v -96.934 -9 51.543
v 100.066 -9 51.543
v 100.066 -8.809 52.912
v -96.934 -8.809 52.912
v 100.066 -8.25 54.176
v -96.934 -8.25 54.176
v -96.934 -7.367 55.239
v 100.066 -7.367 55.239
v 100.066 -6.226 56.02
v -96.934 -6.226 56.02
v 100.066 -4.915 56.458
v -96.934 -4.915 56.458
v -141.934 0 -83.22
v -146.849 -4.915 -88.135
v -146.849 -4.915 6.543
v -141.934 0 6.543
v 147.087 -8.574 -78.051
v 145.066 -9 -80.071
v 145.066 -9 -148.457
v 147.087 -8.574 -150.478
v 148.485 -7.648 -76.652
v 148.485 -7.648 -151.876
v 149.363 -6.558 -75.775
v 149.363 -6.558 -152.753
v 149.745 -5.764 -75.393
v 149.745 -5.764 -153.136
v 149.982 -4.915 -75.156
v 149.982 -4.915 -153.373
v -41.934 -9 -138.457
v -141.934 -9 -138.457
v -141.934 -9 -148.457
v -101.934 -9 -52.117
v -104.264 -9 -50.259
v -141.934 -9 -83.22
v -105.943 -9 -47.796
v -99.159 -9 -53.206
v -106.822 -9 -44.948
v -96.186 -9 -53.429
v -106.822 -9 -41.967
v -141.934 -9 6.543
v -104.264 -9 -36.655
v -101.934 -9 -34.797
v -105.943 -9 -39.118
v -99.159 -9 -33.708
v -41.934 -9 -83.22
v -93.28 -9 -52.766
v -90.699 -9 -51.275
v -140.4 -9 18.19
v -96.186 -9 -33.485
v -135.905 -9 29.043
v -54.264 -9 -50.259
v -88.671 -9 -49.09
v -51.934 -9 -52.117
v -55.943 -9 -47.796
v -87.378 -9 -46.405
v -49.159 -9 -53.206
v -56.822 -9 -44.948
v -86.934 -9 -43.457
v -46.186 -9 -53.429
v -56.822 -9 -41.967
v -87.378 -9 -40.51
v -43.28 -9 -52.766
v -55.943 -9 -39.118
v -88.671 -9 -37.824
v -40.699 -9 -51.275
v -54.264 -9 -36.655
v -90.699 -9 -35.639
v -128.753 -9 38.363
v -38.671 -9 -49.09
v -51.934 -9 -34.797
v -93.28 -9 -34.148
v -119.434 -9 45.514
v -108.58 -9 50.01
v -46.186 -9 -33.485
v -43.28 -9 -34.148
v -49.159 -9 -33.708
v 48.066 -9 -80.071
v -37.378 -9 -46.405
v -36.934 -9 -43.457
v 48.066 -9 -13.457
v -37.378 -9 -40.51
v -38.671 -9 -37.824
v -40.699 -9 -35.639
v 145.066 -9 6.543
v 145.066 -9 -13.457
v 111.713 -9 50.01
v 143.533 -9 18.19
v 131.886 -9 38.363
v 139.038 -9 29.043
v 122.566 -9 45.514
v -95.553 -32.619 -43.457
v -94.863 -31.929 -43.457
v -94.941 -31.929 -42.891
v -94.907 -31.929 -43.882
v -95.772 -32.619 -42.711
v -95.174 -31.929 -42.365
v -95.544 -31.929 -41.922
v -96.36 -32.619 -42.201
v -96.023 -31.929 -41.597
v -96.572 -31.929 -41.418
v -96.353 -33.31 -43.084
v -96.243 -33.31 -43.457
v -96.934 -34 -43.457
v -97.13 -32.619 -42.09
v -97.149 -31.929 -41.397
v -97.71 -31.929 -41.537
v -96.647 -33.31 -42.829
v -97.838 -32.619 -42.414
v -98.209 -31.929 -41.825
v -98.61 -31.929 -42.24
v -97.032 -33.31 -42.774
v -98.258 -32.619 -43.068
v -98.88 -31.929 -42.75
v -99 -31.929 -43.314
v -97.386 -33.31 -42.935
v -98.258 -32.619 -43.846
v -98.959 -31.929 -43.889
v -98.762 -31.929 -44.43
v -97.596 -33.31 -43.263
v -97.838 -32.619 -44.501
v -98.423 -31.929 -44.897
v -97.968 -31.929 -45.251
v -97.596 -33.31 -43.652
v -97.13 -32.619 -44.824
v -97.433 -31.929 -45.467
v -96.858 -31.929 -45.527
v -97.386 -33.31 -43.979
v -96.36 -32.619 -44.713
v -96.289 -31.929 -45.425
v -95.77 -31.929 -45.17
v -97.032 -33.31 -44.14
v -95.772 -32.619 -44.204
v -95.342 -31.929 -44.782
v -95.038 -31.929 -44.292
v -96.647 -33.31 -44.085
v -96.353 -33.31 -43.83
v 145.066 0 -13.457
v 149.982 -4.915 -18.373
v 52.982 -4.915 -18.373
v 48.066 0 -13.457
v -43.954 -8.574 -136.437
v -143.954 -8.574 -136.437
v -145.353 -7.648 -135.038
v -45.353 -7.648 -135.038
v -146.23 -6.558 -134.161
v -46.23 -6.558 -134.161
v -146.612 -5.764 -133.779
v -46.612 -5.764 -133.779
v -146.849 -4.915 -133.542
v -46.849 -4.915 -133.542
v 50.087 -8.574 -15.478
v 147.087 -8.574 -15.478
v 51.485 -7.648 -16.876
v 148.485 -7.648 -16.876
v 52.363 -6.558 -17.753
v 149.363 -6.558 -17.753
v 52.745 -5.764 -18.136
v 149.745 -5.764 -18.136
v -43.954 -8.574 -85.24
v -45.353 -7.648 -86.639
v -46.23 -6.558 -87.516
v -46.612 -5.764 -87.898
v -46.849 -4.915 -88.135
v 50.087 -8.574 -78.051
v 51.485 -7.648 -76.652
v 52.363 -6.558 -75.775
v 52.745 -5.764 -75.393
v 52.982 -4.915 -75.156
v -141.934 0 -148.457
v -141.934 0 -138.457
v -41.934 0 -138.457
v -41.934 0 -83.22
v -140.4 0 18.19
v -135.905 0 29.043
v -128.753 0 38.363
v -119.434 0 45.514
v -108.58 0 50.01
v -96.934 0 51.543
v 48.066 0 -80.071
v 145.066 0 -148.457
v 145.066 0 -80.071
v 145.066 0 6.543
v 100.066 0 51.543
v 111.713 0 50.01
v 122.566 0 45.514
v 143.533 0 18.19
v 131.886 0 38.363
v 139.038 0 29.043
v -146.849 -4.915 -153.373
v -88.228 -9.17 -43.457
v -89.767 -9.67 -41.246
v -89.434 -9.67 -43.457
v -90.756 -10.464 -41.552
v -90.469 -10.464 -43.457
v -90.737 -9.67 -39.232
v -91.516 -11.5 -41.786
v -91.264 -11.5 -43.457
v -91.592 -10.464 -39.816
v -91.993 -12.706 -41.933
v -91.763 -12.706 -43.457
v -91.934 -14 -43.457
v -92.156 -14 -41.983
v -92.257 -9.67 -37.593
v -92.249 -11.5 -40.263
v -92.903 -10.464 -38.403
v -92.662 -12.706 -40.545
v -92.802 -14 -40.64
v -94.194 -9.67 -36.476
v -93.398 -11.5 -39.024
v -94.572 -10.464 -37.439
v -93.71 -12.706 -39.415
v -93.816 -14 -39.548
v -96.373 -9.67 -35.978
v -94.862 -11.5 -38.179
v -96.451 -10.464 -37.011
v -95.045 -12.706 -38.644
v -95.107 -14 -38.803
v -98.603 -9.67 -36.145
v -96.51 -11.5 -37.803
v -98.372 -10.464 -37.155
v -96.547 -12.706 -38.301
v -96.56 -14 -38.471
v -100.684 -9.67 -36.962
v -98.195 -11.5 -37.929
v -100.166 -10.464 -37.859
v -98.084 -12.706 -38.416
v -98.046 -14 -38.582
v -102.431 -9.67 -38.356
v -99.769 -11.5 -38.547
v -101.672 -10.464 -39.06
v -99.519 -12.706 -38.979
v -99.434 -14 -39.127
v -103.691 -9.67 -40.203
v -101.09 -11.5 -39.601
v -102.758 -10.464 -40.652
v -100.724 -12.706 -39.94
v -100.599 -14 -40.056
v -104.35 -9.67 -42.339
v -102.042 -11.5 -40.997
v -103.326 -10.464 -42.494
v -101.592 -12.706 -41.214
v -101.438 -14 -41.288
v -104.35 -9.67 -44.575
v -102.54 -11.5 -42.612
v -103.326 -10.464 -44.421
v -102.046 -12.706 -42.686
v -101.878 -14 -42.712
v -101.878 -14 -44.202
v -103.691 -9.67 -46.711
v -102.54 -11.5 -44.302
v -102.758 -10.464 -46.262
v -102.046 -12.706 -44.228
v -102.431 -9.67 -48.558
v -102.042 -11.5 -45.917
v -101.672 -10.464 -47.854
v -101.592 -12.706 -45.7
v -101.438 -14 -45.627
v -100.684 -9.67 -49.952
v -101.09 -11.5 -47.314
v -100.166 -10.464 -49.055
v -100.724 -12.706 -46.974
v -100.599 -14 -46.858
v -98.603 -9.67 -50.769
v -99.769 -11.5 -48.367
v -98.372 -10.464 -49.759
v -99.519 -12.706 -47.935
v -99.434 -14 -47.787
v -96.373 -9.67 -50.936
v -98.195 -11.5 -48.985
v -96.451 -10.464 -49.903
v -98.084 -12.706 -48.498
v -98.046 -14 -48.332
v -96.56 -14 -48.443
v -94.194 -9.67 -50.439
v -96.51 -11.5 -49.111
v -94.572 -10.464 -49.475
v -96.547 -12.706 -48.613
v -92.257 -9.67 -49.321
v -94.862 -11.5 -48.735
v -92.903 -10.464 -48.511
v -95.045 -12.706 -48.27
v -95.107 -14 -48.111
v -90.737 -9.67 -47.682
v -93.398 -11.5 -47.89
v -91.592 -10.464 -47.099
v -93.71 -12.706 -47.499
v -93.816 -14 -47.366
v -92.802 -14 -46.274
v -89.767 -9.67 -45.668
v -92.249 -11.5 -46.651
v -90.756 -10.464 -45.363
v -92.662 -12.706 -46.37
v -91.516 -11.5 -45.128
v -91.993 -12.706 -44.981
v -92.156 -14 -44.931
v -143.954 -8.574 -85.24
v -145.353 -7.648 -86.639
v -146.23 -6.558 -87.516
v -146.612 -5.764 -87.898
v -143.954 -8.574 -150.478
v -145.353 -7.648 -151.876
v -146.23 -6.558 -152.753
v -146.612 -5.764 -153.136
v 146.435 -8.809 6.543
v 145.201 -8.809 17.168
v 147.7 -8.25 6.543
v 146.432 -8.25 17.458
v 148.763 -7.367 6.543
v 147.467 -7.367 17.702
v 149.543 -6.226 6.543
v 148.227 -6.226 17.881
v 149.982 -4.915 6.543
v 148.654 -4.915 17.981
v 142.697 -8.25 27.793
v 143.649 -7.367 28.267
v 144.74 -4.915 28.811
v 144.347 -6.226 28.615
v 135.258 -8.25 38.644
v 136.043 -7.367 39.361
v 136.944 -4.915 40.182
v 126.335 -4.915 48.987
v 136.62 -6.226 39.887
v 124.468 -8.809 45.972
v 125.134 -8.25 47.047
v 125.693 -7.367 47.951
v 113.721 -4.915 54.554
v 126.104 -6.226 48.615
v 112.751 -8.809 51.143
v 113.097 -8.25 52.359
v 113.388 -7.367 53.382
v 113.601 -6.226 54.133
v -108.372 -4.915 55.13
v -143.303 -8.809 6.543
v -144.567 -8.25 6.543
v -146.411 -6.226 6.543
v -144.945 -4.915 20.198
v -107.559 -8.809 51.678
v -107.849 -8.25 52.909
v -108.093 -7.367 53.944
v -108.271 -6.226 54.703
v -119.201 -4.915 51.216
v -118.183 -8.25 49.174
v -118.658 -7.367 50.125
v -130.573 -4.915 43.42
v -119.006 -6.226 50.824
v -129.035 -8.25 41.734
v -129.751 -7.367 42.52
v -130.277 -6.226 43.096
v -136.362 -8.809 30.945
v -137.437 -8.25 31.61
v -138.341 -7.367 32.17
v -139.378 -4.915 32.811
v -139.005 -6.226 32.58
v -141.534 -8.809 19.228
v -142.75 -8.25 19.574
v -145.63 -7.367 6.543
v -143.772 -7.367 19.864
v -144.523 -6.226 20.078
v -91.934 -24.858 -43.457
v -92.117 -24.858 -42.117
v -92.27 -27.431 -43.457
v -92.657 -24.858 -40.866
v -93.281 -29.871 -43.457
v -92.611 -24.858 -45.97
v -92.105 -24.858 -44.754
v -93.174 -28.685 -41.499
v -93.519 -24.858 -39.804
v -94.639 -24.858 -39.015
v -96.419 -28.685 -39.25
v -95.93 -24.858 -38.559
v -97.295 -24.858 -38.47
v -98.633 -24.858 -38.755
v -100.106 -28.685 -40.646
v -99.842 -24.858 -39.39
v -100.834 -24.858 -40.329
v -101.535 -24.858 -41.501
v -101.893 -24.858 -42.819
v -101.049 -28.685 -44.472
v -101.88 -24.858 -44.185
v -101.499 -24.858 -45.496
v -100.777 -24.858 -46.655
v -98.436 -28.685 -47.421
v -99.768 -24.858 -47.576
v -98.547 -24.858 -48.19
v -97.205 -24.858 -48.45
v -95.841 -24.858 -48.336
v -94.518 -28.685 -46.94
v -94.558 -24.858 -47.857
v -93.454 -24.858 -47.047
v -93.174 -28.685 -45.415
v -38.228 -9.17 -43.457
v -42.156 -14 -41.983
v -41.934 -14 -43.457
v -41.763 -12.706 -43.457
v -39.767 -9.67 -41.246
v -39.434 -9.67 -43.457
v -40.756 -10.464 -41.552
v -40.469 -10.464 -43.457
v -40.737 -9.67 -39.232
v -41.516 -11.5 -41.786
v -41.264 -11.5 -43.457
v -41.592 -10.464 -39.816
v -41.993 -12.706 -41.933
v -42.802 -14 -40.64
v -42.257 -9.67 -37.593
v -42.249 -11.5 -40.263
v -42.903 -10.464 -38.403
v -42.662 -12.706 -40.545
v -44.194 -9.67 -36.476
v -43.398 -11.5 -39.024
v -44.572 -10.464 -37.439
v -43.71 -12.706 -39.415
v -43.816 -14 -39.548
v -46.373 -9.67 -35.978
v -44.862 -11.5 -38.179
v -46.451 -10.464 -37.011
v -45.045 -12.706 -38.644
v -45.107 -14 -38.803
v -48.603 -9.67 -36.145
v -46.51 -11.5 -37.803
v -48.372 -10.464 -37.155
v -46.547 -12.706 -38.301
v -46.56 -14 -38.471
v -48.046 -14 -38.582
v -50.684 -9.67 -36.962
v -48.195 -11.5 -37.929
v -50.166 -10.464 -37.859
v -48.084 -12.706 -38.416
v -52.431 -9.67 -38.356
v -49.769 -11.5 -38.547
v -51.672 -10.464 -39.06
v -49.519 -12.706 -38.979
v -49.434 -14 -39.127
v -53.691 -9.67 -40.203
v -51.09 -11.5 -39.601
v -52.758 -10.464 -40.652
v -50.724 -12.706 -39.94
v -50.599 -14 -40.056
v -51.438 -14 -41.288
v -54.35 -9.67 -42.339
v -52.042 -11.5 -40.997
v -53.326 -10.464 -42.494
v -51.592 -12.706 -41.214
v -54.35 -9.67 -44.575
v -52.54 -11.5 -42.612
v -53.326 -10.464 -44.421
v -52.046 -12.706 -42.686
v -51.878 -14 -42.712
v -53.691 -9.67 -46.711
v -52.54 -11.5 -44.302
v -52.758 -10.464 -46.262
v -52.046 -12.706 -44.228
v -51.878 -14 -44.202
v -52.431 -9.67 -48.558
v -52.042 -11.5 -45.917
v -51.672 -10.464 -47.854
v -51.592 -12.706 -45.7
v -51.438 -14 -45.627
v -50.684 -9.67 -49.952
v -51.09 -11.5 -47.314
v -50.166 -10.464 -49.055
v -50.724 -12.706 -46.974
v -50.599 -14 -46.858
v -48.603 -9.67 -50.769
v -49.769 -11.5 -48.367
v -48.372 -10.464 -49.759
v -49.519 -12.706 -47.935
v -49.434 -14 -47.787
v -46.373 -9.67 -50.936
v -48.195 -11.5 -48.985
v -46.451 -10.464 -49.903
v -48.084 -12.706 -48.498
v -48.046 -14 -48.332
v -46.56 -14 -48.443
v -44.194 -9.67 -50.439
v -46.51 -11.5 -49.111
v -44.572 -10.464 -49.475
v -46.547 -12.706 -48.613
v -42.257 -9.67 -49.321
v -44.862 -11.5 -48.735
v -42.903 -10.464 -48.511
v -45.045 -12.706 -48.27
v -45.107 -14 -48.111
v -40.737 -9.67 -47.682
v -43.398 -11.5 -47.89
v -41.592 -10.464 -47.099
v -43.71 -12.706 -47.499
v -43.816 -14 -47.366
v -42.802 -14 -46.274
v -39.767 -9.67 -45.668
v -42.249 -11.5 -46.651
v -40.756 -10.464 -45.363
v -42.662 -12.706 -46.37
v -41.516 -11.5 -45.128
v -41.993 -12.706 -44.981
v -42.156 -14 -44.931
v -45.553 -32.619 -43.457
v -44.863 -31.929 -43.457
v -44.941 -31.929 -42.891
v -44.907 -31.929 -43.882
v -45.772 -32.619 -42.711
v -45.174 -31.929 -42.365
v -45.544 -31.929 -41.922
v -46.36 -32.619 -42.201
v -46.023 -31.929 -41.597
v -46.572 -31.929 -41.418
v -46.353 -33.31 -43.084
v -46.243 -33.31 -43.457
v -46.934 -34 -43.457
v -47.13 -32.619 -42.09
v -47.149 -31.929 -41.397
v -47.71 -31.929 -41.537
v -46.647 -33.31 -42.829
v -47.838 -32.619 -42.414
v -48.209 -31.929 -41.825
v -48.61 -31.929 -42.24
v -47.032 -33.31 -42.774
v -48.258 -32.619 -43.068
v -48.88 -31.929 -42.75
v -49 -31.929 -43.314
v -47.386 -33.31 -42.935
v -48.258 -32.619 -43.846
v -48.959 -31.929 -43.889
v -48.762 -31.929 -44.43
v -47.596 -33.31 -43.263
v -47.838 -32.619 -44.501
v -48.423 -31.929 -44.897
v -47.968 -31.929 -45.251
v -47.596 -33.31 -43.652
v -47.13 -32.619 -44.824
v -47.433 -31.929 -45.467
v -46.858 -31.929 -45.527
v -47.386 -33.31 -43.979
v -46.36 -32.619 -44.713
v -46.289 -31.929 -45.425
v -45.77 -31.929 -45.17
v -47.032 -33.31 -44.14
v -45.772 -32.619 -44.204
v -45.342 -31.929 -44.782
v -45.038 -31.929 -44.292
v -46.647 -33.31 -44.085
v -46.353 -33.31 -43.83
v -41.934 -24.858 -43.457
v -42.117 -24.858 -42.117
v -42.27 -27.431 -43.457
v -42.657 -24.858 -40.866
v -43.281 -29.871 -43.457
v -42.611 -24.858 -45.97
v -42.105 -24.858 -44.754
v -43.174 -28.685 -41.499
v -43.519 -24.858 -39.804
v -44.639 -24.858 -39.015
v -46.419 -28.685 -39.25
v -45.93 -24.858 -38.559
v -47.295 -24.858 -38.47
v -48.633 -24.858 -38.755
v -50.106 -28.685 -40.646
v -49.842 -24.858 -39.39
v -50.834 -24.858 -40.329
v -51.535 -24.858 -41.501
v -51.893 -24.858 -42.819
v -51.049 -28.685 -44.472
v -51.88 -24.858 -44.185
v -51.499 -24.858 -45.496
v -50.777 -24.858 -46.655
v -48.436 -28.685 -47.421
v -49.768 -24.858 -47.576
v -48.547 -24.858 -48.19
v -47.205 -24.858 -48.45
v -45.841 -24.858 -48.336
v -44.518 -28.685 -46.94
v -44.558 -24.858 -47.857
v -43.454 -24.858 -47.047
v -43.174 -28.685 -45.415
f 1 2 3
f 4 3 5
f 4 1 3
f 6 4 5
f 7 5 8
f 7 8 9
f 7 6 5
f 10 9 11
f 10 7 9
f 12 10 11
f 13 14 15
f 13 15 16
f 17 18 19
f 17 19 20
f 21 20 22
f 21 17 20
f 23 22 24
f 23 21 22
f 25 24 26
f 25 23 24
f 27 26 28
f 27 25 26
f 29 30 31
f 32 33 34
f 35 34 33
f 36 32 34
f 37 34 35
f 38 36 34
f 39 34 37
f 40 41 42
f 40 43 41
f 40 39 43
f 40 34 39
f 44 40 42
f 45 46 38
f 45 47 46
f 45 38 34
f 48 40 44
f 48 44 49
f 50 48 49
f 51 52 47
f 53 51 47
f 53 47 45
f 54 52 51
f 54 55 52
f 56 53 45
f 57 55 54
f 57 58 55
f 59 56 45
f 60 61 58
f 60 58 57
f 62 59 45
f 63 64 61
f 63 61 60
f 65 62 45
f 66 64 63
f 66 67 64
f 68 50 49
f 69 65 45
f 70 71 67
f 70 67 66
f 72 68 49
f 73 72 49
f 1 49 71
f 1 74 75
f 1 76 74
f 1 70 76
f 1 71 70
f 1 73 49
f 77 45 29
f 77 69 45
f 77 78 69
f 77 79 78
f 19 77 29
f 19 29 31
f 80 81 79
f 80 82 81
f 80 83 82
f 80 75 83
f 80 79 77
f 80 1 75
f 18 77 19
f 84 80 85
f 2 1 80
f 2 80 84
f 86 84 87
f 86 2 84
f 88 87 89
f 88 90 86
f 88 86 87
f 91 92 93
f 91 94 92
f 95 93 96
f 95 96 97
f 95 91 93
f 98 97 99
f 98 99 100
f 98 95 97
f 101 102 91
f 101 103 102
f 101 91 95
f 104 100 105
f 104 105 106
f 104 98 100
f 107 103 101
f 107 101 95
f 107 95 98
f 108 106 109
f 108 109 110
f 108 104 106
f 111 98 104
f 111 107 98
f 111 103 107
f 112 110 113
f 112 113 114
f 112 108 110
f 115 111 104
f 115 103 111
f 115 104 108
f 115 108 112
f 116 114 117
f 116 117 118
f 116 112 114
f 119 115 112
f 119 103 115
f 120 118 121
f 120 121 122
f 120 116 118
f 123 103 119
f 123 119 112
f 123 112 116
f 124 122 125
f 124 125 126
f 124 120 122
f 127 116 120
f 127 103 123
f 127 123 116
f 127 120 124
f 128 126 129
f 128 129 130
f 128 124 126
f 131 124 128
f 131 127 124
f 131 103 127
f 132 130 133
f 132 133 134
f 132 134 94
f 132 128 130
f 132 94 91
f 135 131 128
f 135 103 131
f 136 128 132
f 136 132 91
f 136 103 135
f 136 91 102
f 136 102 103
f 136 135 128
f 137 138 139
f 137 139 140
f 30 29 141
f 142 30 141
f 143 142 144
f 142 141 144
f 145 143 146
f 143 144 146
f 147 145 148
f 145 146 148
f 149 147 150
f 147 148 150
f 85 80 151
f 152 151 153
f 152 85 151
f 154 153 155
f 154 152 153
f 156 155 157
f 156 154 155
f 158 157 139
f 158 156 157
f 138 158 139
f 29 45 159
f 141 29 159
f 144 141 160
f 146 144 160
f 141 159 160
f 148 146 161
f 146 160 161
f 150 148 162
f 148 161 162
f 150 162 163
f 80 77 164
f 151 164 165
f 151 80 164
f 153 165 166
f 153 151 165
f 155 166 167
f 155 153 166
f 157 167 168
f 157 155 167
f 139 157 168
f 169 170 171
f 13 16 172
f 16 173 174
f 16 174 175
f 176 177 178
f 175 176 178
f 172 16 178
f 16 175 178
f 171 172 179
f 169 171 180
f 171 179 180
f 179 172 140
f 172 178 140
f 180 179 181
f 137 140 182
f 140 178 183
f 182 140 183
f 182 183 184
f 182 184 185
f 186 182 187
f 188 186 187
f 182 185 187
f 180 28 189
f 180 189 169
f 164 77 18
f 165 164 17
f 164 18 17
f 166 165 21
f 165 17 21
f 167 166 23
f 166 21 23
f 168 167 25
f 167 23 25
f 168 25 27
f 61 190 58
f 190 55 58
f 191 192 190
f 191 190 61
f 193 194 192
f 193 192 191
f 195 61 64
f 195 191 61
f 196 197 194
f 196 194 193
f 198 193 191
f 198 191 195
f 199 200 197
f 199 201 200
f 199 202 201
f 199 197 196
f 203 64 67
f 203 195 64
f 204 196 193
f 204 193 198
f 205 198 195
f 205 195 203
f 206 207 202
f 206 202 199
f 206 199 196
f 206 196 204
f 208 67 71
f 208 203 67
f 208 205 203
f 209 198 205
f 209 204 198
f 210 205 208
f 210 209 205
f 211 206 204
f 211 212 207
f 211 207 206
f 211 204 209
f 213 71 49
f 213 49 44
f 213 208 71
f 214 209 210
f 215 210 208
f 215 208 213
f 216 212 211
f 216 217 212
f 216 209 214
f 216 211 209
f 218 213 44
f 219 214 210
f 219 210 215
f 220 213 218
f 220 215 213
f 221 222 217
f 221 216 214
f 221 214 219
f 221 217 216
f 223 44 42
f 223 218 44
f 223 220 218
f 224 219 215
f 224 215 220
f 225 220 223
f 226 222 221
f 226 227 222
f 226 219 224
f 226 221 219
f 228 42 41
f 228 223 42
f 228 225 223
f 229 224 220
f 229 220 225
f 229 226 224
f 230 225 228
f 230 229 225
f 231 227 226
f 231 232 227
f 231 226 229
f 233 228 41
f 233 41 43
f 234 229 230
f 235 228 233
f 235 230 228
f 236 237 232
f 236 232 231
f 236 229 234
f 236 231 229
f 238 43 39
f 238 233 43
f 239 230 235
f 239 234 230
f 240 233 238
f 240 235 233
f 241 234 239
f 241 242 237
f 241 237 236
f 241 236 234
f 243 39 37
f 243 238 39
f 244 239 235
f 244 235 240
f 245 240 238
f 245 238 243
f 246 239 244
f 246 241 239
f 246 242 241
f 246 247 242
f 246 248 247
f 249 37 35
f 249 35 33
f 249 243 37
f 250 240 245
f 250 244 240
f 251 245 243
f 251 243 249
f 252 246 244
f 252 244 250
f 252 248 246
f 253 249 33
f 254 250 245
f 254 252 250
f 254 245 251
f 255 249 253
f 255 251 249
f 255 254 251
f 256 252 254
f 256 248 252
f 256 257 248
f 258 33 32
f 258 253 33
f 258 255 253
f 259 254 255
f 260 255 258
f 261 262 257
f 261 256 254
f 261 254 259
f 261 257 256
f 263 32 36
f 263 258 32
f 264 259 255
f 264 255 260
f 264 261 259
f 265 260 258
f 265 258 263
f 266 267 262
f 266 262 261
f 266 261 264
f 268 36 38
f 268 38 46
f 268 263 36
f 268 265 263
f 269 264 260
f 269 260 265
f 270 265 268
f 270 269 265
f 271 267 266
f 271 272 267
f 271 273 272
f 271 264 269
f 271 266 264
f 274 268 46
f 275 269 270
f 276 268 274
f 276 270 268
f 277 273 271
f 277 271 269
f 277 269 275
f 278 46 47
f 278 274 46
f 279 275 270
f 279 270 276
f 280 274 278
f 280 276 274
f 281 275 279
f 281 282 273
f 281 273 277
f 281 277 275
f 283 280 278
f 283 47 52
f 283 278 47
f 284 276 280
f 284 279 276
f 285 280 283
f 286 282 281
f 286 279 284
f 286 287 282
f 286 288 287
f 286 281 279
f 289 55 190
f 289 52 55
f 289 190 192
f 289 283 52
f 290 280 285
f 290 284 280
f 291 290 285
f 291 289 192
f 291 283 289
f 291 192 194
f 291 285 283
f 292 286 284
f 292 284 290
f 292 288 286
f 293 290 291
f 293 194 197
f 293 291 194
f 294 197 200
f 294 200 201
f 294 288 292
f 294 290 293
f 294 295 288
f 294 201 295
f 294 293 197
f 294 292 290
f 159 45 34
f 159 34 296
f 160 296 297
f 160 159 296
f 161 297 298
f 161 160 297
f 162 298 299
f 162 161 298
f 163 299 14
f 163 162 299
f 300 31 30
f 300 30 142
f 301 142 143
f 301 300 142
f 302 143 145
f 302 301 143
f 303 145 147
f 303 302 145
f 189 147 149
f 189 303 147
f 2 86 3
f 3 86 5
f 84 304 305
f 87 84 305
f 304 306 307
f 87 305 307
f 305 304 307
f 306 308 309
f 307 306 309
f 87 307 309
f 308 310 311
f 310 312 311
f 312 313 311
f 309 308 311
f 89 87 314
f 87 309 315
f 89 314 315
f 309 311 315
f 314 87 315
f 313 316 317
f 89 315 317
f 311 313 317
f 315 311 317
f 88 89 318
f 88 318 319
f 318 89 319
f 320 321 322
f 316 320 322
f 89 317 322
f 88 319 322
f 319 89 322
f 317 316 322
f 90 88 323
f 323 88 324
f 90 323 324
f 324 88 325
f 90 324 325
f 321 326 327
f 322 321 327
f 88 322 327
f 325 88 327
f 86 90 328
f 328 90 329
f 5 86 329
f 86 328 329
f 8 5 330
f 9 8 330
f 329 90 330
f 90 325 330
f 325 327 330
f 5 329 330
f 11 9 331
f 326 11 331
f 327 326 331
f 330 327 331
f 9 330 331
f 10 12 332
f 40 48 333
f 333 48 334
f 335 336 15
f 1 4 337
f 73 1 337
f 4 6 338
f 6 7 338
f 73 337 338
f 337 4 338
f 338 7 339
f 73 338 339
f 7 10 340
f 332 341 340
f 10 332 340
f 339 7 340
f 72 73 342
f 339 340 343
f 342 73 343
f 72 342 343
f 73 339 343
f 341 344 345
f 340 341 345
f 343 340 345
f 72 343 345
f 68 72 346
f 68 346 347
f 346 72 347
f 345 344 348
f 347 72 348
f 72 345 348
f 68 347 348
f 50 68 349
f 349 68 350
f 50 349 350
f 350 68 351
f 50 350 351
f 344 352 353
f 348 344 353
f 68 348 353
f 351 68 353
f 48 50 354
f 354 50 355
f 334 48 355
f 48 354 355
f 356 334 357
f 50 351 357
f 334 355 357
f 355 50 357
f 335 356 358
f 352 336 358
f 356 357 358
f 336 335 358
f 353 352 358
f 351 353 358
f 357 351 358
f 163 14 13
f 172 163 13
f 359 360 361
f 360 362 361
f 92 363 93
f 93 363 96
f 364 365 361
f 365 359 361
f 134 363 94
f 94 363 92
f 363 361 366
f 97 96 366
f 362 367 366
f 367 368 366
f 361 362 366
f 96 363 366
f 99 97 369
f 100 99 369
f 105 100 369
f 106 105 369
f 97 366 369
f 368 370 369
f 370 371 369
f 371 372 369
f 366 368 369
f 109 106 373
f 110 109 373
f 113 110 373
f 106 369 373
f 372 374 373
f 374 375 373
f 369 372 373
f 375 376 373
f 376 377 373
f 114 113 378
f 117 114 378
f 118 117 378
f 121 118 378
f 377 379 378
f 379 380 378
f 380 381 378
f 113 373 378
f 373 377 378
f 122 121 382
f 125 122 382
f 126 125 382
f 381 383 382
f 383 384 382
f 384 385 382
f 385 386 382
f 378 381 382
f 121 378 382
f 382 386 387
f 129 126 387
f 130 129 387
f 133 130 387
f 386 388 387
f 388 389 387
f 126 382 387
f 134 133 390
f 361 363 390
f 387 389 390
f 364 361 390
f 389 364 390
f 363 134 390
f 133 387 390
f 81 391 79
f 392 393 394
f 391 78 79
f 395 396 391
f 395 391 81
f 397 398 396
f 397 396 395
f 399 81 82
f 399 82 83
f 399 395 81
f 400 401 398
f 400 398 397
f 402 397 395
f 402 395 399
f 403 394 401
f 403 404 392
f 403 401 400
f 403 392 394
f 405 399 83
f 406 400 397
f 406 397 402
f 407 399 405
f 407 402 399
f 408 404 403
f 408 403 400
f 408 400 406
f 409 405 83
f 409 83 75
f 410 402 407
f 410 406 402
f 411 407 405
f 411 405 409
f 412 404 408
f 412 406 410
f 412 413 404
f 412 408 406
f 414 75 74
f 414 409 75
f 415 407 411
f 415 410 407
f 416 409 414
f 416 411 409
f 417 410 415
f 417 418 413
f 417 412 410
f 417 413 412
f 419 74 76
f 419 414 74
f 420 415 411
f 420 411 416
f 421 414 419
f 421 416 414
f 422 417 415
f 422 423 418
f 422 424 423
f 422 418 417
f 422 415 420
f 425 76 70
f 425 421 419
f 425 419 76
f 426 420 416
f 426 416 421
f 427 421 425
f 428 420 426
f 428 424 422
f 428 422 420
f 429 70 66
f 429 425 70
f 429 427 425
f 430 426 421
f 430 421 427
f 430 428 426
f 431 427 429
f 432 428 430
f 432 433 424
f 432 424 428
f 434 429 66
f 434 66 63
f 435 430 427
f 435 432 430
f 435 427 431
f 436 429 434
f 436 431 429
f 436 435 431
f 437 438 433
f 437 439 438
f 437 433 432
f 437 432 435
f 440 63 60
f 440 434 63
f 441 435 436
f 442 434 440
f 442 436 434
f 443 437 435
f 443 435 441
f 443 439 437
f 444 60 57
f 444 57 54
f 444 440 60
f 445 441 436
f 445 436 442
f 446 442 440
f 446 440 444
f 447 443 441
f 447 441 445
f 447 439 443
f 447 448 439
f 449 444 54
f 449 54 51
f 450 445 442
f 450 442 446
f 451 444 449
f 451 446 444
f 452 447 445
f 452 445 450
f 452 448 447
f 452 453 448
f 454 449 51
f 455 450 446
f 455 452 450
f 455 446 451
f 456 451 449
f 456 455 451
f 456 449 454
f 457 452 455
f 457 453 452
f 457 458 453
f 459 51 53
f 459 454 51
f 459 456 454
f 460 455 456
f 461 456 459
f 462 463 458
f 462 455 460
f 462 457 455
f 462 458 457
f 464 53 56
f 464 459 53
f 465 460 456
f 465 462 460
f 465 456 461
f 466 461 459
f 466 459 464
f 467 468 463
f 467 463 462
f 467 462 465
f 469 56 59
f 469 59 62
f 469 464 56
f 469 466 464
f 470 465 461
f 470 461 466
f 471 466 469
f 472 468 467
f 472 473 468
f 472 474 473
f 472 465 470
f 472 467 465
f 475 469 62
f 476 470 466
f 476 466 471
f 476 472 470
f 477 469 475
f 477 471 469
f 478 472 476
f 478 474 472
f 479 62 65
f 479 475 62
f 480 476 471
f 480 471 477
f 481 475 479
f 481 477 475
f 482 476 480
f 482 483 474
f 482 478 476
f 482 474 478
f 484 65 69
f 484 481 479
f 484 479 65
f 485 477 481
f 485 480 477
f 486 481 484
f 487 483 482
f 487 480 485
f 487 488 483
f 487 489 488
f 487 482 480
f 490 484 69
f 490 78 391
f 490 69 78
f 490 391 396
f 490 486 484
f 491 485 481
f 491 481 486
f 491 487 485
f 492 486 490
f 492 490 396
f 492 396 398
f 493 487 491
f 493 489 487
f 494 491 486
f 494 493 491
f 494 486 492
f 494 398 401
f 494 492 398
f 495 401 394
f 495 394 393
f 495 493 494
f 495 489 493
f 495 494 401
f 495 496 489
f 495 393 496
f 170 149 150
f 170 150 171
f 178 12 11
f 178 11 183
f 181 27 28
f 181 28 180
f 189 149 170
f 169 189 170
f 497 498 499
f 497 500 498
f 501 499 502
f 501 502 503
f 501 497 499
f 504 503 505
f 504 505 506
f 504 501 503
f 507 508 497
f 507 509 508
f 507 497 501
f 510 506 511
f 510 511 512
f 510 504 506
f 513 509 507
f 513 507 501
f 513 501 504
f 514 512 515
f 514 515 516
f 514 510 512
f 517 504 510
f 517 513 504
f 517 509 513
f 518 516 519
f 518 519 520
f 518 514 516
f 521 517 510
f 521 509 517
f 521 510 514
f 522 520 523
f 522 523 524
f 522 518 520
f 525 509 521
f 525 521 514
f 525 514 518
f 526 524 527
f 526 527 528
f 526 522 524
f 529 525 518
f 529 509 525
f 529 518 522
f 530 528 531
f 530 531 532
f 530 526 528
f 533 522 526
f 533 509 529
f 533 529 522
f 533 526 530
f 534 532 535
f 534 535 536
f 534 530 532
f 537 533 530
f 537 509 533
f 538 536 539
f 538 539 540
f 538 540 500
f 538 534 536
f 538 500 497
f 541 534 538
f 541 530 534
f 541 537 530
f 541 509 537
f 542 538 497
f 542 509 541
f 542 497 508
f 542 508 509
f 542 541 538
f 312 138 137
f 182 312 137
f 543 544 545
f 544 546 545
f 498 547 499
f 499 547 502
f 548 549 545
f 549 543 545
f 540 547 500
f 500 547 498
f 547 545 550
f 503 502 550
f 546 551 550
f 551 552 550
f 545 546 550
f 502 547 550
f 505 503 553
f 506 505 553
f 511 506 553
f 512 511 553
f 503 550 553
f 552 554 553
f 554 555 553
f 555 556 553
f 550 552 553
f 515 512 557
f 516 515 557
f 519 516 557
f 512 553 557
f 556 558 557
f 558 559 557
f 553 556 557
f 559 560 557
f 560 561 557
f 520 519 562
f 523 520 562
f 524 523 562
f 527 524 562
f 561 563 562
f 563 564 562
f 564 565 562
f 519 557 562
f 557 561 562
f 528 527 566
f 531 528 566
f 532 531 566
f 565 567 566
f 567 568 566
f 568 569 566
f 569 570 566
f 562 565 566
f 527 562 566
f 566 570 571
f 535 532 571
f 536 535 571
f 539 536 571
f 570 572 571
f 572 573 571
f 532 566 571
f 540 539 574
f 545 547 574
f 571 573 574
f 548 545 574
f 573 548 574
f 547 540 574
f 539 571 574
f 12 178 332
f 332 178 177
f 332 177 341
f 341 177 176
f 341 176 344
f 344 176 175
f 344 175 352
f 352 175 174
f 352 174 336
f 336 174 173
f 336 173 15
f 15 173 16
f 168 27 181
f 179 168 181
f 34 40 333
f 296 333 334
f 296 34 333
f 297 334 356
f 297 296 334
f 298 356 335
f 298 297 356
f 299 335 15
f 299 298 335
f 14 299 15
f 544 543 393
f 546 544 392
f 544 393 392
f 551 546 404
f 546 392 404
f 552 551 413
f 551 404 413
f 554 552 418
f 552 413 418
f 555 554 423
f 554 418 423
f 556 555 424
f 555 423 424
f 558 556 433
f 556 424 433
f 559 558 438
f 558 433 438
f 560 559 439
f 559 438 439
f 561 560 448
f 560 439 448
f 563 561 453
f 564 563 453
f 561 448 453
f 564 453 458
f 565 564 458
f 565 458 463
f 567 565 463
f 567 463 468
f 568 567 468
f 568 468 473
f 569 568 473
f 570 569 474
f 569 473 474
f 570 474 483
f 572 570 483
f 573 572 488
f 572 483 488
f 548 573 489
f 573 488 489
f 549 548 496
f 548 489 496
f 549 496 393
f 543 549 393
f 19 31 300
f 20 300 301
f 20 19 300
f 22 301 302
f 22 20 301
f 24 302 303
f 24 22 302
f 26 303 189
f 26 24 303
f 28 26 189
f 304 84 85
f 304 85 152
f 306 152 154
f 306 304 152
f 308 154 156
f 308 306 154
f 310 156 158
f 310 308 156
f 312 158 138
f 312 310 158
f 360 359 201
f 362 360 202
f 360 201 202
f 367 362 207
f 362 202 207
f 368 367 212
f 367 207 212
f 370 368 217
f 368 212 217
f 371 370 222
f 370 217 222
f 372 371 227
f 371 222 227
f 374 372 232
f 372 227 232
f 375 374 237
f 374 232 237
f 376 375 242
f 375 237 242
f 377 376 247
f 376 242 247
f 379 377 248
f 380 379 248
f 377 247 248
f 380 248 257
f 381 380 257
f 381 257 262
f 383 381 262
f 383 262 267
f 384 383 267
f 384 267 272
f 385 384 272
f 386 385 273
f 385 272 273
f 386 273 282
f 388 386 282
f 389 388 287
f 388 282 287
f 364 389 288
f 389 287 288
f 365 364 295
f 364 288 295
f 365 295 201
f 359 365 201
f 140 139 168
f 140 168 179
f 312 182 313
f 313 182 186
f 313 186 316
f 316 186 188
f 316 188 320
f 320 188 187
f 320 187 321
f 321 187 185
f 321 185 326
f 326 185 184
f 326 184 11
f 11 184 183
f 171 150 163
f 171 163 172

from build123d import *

# Parameters (mm, degrees)
F1_DEPTH      = 9
F2_R          = 5
F3_DEPTH      = 25
F4_W          = 103.9993347282
F4_H          = 56.6140824735
F5_DEPTH      = 25
F6_W          = 113.1558813547
F6_H          = 45.2373955332
F7_DEPTH      = 25
F8_R          = 5
F9_SIZE       = 5
F10_R         = 10
F11_T1_DEPTH  = 37.8584149398
F11_T3_DEPTH  = 109.8584149398
F11_T5_DEPTH  = 56.6140824735
F11_T7_DEPTH  = 104.1027474062
F11_T9_DEPTH  = 322.7168298797
F11_T11_DEPTH = 45.7168298797
F11_T13_DEPTH = 112.8584149398
F11_T15_DEPTH = 45.2373955332
F11_T17_DEPTH = 107.6210194067
F11_T19_DEPTH = 197
F11_T22_ANGLE = 90
F11_T24_ANGLE = 90
F11_T29_DEPTH = 122.7168298797
F11_T33_DEPTH = 69.4724974133
F11_T40_DEPTH = 69.4724974133
F11_T44_DEPTH = 122.7168298797
F11_T51_DEPTH = 58.095810473
F11_T55_DEPTH = 125.7168298797
F11_T62_DEPTH = 125.7168298797
F11_T66_DEPTH = 58.095810473


# Not quite as in the source:
# - a fillet or chamfer that OpenCascade refuses, or shapes differently, is made with other operations: its cross-section is extruded or revolved along the edge and cut away or added


with BuildPart() as f1:
    # F0 (on Front) → F1 (new body)
    with BuildSketch(Plane.XZ):
        with BuildLine():
            Line((100.0664040952, 56.5429037459), (-96.9335959048, 56.5429037459))
            ThreePointArc((-96.9335959048, 56.5429037459), (-132.2889349642, 41.8982428052), (-146.9335959048, 6.5429037459))
            Line((-146.9335959048, 6.5429037459), (-146.9335959048, -153.4570962541))
            Line((-146.9335959048, -153.4570962541), (150.0664040952, -153.4570962541))
            Line((150.0664040952, -153.4570962541), (150.0664040952, 6.5429037459))
            ThreePointArc((150.0664040952, 6.5429037459), (135.4217431545, 41.8982428052), (100.0664040952, 56.5429037459))
        make_face()
    extrude(amount=F1_DEPTH)

    # F2 (on face) → F3 (join)
    with BuildSketch(Plane.XZ.offset(9)):
        with Locations((-46.9335959048, -43.4570962541)):
            Circle(F2_R)
        with Locations((-96.9335959048, -43.4570962541)):
            Circle(F2_R)
    extrude(amount=F3_DEPTH)

    # F4 (on face) → F5 (cut)
    with BuildSketch(Plane.XZ.offset(9)):
        with Locations((105.0660714593, -46.7641374908)):
            Rectangle(F4_W, F4_H)
    extrude(amount=-F5_DEPTH, mode=Mode.SUBTRACT)

    # F6 (on face) → F7 (cut)
    with BuildSketch(Plane.XZ.offset(9)):
        with Locations((-103.5115365822, -110.8383984875)):
            Rectangle(F6_W, F6_H)
    extrude(amount=-F7_DEPTH, mode=Mode.SUBTRACT)

    # F8
    f8_edges = [f1.edges().sort_by_distance(p)[0] for p in [
        (150.066404, -9, -5.957096),
        (101.566404, -9, -18.457096),
        (53.066404, -9, -46.764137),
        (101.566404, -9, -75.071179),
        (150.066404, -9, -114.264137),
        (1.566404, -9, -153.457096),
        (-146.933596, -9, -143.457096),
        (-96.933596, -9, -133.457096),
        (-46.933596, -9, -110.838398),
        (-96.933596, -9, -88.219701),
        (-146.933596, -9, -40.838398),
        (-132.288935, -9, 41.898243),
        (1.566404, -9, 56.542904),
        (135.421743, -9, 41.898243),
        (-101.933596, -9, -43.457096),
        (-51.933596, -9, -43.457096),
    ]]
    fillet(f8_edges, radius=F8_R)

    # F9
    f9_edges = [f1.edges().sort_by_distance(p)[0] for p in [
        (-101.933596, -34, -43.457096),
        (-51.933596, -34, -43.457096),
    ]]
    chamfer(f9_edges, length=F9_SIZE)

    # F10
    f10_edges = [f1.edges().sort_by_distance(p)[0] for p in [
        (-94.433596, -31.5, -43.457096),
        (-101.933596, -29, -43.457096),
        (-44.433596, -31.5, -43.457096),
        (-51.933596, -29, -43.457096),
    ]]
    fillet(f10_edges, radius=F10_R)

    # F11: chamfer of 5 on 14 edges, made by hand

    # F11_s2 → F11_t1 (cut)
    with BuildSketch(Plane.XY.offset(-31.3155111939)):
        Polygon((150.0664040952, -5), (145.0664040952, 0), (150.0664040952, 0), align=None)
    extrude(amount=F11_T1_DEPTH, mode=Mode.SUBTRACT)

    # F11_s4 → F11_t3 (cut)
    with BuildSketch(Plane.YZ.offset(53.0664040952)):
        Polygon((-5, -18.4570962541), (0, -13.4570962541), (0, -18.4570962541), align=None)
        Polygon((-5, -75.0711787276), (0, -80.0711787276), (0, -75.0711787276), align=None)
    extrude(amount=F11_T3_DEPTH, mode=Mode.SUBTRACT)

    # F11_s6 → F11_t5 (cut)
    with BuildSketch(Plane.XY.offset(-75.0711787276)):
        Polygon((53.0664040952, -5), (48.0664040952, 0), (53.0664040952, 0), align=None)
    extrude(amount=F11_T5_DEPTH, mode=Mode.SUBTRACT)

    # F11_s8 → F11_t7 (cut)
    with BuildSketch(Plane.XY.offset(-166.3155111939)):
        Polygon((150.0664040952, -5), (145.0664040952, 0), (150.0664040952, 0), align=None)
    extrude(amount=F11_T7_DEPTH, mode=Mode.SUBTRACT)

    # F11_s10 → F11_t9 (cut)
    with BuildSketch(Plane.YZ.offset(-159.7920108447)):
        Polygon((-5, -153.4570962541), (0, -148.4570962541), (0, -153.4570962541), align=None)
    extrude(amount=F11_T9_DEPTH, mode=Mode.SUBTRACT)

    # F11_s12 → F11_t11 (cut)
    with BuildSketch(Plane.XY.offset(-166.3155111939)):
        Polygon((-146.9335959048, -5), (-141.9335959048, 0), (-146.9335959048, 0), align=None)
    extrude(amount=F11_T11_DEPTH, mode=Mode.SUBTRACT)

    # F11_s14 → F11_t13 (cut)
    with BuildSketch(Plane.YZ.offset(-159.7920108447)):
        Polygon((-5, -133.4570962541), (0, -138.4570962541), (0, -133.4570962541), align=None)
        Polygon((-5, -88.2197007209), (0, -83.2197007209), (0, -88.2197007209), align=None)
    extrude(amount=F11_T13_DEPTH, mode=Mode.SUBTRACT)

    # F11_s16 → F11_t15 (cut)
    with BuildSketch(Plane.XY.offset(-133.4570962541)):
        Polygon((-46.9335959048, -5), (-41.9335959048, 0), (-46.9335959048, 0), align=None)
    extrude(amount=F11_T15_DEPTH, mode=Mode.SUBTRACT)

    # F11_s18 → F11_t17 (cut)
    with BuildSketch(Plane.XY.offset(-101.0781156608)):
        Polygon((-146.9335959048, -5), (-141.9335959048, 0), (-146.9335959048, 0), align=None)
    extrude(amount=F11_T17_DEPTH, mode=Mode.SUBTRACT)

    # F11_s20 → F11_t19 (cut)
    with BuildSketch(Plane.YZ.offset(-96.9335959048)):
        Polygon((-5, 56.5429037459), (0, 51.5429037459), (0, 56.5429037459), align=None)
    extrude(amount=F11_T19_DEPTH, mode=Mode.SUBTRACT)

    # F11_s21 → F11_t22 (revolve, cut)
    with BuildSketch(Plane.YZ.offset(-96.9335959048)):
        Polygon((-5, 56.5429037459), (0, 51.5429037459), (0, 56.5429037459), align=None)
    revolve(axis=Axis((-96.9335959048, 0, 6.5429037459), (0, -1, 0)), revolution_arc=F11_T22_ANGLE, mode=Mode.SUBTRACT)

    # F11_s23 → F11_t24 (revolve, cut)
    with BuildSketch(Plane.XY.offset(6.5429037459)):
        Polygon((150.0664040952, -5), (145.0664040952, 0), (150.0664040952, 0), align=None)
    revolve(axis=Axis((100.0664040952, 0, 6.5429037459), (0, -1, 0)), revolution_arc=F11_T24_ANGLE, mode=Mode.SUBTRACT)


with BuildPart() as f11_tool27:
    # F11_s28 → F11_t29 (new body)
    with BuildSketch(Plane.YZ.offset(162.924819035)):
        Polygon((-5, -18.4570962541), (0, -13.4570962541), (0, -18.4570962541), align=None)
    extrude(amount=-F11_T29_DEPTH)

    split(bisect_by=Plane.YZ.offset(53.0664040952), keep=Keep.BOTTOM)


with BuildPart() as f11_tool31:
    # F11_s32 → F11_t33 (new body)
    with BuildSketch(Plane.XY.offset(-5.5986813143)):
        Polygon((53.0664040952, -5), (48.0664040952, 0), (53.0664040952, 0), align=None)
    extrude(amount=-F11_T33_DEPTH)

    split(bisect_by=Plane.XY.offset(-18.4570962541), keep=Keep.TOP)


with BuildPart() as f11_tool27_1:
    add(f11_tool27.part)

    # F11_t35: intersect F11_tool31
    add(f11_tool31.part, mode=Mode.INTERSECT)


with BuildPart() as f1_1:
    add(f1.part)

    # F11_t25: cut F11_tool27
    add(f11_tool27_1.part, mode=Mode.SUBTRACT)


with BuildPart() as f11_tool38:
    # F11_s39 → F11_t40 (new body)
    with BuildSketch(Plane.XY.offset(-18.4570962541)):
        Polygon((53.0664040952, -5), (48.0664040952, 0), (53.0664040952, 0), align=None)
    extrude(amount=-F11_T40_DEPTH)

    split(bisect_by=Plane.XY.offset(-75.0711787276), keep=Keep.BOTTOM)


with BuildPart() as f11_tool42:
    # F11_s43 → F11_t44 (new body)
    with BuildSketch(Plane.YZ.offset(40.2079891553)):
        Polygon((-5, -75.0711787276), (0, -80.0711787276), (0, -75.0711787276), align=None)
    extrude(amount=F11_T44_DEPTH)

    split(bisect_by=Plane.YZ.offset(53.0664040952), keep=Keep.BOTTOM)


with BuildPart() as f11_tool38_1:
    add(f11_tool38.part)

    # F11_t46: intersect F11_tool42
    add(f11_tool42.part, mode=Mode.INTERSECT)


with BuildPart() as f1_2:
    add(f1_1.part)

    # F11_t36: cut F11_tool38
    add(f11_tool38_1.part, mode=Mode.SUBTRACT)


with BuildPart() as f11_tool49:
    # F11_s50 → F11_t51 (new body)
    with BuildSketch(Plane.XY.offset(-146.3155111939)):
        Polygon((-46.9335959048, -5), (-41.9335959048, 0), (-46.9335959048, 0), align=None)
    extrude(amount=F11_T51_DEPTH)

    split(bisect_by=Plane.XY.offset(-133.4570962541), keep=Keep.BOTTOM)


with BuildPart() as f11_tool53:
    # F11_s54 → F11_t55 (new body)
    with BuildSketch(Plane.YZ.offset(-159.7920108447)):
        Polygon((-5, -133.4570962541), (0, -138.4570962541), (0, -133.4570962541), align=None)
    extrude(amount=F11_T55_DEPTH)

    split(bisect_by=Plane.YZ.offset(-46.9335959048), keep=Keep.TOP)


with BuildPart() as f11_tool49_1:
    add(f11_tool49.part)

    # F11_t57: intersect F11_tool53
    add(f11_tool53.part, mode=Mode.INTERSECT)


with BuildPart() as f1_3:
    add(f1_2.part)

    # F11_t47: cut F11_tool49
    add(f11_tool49_1.part, mode=Mode.SUBTRACT)


with BuildPart() as f11_tool60:
    # F11_s61 → F11_t62 (new body)
    with BuildSketch(Plane.YZ.offset(-34.075180965)):
        Polygon((-5, -88.2197007209), (0, -83.2197007209), (0, -88.2197007209), align=None)
    extrude(amount=-F11_T62_DEPTH)

    split(bisect_by=Plane.YZ.offset(-46.9335959048), keep=Keep.TOP)


with BuildPart() as f11_tool64:
    # F11_s65 → F11_t66 (new body)
    with BuildSketch(Plane.XY.offset(-133.4570962541)):
        Polygon((-46.9335959048, -5), (-41.9335959048, 0), (-46.9335959048, 0), align=None)
    extrude(amount=F11_T66_DEPTH)

    split(bisect_by=Plane.XY.offset(-88.2197007209), keep=Keep.TOP)


with BuildPart() as f11_tool60_1:
    add(f11_tool60.part)

    # F11_t68: intersect F11_tool64
    add(f11_tool64.part, mode=Mode.INTERSECT)


with BuildPart() as f1_4:
    add(f1_3.part)

    # F11_t58: cut F11_tool60
    add(f11_tool60_1.part, mode=Mode.SUBTRACT)


solid = f1_4.part
